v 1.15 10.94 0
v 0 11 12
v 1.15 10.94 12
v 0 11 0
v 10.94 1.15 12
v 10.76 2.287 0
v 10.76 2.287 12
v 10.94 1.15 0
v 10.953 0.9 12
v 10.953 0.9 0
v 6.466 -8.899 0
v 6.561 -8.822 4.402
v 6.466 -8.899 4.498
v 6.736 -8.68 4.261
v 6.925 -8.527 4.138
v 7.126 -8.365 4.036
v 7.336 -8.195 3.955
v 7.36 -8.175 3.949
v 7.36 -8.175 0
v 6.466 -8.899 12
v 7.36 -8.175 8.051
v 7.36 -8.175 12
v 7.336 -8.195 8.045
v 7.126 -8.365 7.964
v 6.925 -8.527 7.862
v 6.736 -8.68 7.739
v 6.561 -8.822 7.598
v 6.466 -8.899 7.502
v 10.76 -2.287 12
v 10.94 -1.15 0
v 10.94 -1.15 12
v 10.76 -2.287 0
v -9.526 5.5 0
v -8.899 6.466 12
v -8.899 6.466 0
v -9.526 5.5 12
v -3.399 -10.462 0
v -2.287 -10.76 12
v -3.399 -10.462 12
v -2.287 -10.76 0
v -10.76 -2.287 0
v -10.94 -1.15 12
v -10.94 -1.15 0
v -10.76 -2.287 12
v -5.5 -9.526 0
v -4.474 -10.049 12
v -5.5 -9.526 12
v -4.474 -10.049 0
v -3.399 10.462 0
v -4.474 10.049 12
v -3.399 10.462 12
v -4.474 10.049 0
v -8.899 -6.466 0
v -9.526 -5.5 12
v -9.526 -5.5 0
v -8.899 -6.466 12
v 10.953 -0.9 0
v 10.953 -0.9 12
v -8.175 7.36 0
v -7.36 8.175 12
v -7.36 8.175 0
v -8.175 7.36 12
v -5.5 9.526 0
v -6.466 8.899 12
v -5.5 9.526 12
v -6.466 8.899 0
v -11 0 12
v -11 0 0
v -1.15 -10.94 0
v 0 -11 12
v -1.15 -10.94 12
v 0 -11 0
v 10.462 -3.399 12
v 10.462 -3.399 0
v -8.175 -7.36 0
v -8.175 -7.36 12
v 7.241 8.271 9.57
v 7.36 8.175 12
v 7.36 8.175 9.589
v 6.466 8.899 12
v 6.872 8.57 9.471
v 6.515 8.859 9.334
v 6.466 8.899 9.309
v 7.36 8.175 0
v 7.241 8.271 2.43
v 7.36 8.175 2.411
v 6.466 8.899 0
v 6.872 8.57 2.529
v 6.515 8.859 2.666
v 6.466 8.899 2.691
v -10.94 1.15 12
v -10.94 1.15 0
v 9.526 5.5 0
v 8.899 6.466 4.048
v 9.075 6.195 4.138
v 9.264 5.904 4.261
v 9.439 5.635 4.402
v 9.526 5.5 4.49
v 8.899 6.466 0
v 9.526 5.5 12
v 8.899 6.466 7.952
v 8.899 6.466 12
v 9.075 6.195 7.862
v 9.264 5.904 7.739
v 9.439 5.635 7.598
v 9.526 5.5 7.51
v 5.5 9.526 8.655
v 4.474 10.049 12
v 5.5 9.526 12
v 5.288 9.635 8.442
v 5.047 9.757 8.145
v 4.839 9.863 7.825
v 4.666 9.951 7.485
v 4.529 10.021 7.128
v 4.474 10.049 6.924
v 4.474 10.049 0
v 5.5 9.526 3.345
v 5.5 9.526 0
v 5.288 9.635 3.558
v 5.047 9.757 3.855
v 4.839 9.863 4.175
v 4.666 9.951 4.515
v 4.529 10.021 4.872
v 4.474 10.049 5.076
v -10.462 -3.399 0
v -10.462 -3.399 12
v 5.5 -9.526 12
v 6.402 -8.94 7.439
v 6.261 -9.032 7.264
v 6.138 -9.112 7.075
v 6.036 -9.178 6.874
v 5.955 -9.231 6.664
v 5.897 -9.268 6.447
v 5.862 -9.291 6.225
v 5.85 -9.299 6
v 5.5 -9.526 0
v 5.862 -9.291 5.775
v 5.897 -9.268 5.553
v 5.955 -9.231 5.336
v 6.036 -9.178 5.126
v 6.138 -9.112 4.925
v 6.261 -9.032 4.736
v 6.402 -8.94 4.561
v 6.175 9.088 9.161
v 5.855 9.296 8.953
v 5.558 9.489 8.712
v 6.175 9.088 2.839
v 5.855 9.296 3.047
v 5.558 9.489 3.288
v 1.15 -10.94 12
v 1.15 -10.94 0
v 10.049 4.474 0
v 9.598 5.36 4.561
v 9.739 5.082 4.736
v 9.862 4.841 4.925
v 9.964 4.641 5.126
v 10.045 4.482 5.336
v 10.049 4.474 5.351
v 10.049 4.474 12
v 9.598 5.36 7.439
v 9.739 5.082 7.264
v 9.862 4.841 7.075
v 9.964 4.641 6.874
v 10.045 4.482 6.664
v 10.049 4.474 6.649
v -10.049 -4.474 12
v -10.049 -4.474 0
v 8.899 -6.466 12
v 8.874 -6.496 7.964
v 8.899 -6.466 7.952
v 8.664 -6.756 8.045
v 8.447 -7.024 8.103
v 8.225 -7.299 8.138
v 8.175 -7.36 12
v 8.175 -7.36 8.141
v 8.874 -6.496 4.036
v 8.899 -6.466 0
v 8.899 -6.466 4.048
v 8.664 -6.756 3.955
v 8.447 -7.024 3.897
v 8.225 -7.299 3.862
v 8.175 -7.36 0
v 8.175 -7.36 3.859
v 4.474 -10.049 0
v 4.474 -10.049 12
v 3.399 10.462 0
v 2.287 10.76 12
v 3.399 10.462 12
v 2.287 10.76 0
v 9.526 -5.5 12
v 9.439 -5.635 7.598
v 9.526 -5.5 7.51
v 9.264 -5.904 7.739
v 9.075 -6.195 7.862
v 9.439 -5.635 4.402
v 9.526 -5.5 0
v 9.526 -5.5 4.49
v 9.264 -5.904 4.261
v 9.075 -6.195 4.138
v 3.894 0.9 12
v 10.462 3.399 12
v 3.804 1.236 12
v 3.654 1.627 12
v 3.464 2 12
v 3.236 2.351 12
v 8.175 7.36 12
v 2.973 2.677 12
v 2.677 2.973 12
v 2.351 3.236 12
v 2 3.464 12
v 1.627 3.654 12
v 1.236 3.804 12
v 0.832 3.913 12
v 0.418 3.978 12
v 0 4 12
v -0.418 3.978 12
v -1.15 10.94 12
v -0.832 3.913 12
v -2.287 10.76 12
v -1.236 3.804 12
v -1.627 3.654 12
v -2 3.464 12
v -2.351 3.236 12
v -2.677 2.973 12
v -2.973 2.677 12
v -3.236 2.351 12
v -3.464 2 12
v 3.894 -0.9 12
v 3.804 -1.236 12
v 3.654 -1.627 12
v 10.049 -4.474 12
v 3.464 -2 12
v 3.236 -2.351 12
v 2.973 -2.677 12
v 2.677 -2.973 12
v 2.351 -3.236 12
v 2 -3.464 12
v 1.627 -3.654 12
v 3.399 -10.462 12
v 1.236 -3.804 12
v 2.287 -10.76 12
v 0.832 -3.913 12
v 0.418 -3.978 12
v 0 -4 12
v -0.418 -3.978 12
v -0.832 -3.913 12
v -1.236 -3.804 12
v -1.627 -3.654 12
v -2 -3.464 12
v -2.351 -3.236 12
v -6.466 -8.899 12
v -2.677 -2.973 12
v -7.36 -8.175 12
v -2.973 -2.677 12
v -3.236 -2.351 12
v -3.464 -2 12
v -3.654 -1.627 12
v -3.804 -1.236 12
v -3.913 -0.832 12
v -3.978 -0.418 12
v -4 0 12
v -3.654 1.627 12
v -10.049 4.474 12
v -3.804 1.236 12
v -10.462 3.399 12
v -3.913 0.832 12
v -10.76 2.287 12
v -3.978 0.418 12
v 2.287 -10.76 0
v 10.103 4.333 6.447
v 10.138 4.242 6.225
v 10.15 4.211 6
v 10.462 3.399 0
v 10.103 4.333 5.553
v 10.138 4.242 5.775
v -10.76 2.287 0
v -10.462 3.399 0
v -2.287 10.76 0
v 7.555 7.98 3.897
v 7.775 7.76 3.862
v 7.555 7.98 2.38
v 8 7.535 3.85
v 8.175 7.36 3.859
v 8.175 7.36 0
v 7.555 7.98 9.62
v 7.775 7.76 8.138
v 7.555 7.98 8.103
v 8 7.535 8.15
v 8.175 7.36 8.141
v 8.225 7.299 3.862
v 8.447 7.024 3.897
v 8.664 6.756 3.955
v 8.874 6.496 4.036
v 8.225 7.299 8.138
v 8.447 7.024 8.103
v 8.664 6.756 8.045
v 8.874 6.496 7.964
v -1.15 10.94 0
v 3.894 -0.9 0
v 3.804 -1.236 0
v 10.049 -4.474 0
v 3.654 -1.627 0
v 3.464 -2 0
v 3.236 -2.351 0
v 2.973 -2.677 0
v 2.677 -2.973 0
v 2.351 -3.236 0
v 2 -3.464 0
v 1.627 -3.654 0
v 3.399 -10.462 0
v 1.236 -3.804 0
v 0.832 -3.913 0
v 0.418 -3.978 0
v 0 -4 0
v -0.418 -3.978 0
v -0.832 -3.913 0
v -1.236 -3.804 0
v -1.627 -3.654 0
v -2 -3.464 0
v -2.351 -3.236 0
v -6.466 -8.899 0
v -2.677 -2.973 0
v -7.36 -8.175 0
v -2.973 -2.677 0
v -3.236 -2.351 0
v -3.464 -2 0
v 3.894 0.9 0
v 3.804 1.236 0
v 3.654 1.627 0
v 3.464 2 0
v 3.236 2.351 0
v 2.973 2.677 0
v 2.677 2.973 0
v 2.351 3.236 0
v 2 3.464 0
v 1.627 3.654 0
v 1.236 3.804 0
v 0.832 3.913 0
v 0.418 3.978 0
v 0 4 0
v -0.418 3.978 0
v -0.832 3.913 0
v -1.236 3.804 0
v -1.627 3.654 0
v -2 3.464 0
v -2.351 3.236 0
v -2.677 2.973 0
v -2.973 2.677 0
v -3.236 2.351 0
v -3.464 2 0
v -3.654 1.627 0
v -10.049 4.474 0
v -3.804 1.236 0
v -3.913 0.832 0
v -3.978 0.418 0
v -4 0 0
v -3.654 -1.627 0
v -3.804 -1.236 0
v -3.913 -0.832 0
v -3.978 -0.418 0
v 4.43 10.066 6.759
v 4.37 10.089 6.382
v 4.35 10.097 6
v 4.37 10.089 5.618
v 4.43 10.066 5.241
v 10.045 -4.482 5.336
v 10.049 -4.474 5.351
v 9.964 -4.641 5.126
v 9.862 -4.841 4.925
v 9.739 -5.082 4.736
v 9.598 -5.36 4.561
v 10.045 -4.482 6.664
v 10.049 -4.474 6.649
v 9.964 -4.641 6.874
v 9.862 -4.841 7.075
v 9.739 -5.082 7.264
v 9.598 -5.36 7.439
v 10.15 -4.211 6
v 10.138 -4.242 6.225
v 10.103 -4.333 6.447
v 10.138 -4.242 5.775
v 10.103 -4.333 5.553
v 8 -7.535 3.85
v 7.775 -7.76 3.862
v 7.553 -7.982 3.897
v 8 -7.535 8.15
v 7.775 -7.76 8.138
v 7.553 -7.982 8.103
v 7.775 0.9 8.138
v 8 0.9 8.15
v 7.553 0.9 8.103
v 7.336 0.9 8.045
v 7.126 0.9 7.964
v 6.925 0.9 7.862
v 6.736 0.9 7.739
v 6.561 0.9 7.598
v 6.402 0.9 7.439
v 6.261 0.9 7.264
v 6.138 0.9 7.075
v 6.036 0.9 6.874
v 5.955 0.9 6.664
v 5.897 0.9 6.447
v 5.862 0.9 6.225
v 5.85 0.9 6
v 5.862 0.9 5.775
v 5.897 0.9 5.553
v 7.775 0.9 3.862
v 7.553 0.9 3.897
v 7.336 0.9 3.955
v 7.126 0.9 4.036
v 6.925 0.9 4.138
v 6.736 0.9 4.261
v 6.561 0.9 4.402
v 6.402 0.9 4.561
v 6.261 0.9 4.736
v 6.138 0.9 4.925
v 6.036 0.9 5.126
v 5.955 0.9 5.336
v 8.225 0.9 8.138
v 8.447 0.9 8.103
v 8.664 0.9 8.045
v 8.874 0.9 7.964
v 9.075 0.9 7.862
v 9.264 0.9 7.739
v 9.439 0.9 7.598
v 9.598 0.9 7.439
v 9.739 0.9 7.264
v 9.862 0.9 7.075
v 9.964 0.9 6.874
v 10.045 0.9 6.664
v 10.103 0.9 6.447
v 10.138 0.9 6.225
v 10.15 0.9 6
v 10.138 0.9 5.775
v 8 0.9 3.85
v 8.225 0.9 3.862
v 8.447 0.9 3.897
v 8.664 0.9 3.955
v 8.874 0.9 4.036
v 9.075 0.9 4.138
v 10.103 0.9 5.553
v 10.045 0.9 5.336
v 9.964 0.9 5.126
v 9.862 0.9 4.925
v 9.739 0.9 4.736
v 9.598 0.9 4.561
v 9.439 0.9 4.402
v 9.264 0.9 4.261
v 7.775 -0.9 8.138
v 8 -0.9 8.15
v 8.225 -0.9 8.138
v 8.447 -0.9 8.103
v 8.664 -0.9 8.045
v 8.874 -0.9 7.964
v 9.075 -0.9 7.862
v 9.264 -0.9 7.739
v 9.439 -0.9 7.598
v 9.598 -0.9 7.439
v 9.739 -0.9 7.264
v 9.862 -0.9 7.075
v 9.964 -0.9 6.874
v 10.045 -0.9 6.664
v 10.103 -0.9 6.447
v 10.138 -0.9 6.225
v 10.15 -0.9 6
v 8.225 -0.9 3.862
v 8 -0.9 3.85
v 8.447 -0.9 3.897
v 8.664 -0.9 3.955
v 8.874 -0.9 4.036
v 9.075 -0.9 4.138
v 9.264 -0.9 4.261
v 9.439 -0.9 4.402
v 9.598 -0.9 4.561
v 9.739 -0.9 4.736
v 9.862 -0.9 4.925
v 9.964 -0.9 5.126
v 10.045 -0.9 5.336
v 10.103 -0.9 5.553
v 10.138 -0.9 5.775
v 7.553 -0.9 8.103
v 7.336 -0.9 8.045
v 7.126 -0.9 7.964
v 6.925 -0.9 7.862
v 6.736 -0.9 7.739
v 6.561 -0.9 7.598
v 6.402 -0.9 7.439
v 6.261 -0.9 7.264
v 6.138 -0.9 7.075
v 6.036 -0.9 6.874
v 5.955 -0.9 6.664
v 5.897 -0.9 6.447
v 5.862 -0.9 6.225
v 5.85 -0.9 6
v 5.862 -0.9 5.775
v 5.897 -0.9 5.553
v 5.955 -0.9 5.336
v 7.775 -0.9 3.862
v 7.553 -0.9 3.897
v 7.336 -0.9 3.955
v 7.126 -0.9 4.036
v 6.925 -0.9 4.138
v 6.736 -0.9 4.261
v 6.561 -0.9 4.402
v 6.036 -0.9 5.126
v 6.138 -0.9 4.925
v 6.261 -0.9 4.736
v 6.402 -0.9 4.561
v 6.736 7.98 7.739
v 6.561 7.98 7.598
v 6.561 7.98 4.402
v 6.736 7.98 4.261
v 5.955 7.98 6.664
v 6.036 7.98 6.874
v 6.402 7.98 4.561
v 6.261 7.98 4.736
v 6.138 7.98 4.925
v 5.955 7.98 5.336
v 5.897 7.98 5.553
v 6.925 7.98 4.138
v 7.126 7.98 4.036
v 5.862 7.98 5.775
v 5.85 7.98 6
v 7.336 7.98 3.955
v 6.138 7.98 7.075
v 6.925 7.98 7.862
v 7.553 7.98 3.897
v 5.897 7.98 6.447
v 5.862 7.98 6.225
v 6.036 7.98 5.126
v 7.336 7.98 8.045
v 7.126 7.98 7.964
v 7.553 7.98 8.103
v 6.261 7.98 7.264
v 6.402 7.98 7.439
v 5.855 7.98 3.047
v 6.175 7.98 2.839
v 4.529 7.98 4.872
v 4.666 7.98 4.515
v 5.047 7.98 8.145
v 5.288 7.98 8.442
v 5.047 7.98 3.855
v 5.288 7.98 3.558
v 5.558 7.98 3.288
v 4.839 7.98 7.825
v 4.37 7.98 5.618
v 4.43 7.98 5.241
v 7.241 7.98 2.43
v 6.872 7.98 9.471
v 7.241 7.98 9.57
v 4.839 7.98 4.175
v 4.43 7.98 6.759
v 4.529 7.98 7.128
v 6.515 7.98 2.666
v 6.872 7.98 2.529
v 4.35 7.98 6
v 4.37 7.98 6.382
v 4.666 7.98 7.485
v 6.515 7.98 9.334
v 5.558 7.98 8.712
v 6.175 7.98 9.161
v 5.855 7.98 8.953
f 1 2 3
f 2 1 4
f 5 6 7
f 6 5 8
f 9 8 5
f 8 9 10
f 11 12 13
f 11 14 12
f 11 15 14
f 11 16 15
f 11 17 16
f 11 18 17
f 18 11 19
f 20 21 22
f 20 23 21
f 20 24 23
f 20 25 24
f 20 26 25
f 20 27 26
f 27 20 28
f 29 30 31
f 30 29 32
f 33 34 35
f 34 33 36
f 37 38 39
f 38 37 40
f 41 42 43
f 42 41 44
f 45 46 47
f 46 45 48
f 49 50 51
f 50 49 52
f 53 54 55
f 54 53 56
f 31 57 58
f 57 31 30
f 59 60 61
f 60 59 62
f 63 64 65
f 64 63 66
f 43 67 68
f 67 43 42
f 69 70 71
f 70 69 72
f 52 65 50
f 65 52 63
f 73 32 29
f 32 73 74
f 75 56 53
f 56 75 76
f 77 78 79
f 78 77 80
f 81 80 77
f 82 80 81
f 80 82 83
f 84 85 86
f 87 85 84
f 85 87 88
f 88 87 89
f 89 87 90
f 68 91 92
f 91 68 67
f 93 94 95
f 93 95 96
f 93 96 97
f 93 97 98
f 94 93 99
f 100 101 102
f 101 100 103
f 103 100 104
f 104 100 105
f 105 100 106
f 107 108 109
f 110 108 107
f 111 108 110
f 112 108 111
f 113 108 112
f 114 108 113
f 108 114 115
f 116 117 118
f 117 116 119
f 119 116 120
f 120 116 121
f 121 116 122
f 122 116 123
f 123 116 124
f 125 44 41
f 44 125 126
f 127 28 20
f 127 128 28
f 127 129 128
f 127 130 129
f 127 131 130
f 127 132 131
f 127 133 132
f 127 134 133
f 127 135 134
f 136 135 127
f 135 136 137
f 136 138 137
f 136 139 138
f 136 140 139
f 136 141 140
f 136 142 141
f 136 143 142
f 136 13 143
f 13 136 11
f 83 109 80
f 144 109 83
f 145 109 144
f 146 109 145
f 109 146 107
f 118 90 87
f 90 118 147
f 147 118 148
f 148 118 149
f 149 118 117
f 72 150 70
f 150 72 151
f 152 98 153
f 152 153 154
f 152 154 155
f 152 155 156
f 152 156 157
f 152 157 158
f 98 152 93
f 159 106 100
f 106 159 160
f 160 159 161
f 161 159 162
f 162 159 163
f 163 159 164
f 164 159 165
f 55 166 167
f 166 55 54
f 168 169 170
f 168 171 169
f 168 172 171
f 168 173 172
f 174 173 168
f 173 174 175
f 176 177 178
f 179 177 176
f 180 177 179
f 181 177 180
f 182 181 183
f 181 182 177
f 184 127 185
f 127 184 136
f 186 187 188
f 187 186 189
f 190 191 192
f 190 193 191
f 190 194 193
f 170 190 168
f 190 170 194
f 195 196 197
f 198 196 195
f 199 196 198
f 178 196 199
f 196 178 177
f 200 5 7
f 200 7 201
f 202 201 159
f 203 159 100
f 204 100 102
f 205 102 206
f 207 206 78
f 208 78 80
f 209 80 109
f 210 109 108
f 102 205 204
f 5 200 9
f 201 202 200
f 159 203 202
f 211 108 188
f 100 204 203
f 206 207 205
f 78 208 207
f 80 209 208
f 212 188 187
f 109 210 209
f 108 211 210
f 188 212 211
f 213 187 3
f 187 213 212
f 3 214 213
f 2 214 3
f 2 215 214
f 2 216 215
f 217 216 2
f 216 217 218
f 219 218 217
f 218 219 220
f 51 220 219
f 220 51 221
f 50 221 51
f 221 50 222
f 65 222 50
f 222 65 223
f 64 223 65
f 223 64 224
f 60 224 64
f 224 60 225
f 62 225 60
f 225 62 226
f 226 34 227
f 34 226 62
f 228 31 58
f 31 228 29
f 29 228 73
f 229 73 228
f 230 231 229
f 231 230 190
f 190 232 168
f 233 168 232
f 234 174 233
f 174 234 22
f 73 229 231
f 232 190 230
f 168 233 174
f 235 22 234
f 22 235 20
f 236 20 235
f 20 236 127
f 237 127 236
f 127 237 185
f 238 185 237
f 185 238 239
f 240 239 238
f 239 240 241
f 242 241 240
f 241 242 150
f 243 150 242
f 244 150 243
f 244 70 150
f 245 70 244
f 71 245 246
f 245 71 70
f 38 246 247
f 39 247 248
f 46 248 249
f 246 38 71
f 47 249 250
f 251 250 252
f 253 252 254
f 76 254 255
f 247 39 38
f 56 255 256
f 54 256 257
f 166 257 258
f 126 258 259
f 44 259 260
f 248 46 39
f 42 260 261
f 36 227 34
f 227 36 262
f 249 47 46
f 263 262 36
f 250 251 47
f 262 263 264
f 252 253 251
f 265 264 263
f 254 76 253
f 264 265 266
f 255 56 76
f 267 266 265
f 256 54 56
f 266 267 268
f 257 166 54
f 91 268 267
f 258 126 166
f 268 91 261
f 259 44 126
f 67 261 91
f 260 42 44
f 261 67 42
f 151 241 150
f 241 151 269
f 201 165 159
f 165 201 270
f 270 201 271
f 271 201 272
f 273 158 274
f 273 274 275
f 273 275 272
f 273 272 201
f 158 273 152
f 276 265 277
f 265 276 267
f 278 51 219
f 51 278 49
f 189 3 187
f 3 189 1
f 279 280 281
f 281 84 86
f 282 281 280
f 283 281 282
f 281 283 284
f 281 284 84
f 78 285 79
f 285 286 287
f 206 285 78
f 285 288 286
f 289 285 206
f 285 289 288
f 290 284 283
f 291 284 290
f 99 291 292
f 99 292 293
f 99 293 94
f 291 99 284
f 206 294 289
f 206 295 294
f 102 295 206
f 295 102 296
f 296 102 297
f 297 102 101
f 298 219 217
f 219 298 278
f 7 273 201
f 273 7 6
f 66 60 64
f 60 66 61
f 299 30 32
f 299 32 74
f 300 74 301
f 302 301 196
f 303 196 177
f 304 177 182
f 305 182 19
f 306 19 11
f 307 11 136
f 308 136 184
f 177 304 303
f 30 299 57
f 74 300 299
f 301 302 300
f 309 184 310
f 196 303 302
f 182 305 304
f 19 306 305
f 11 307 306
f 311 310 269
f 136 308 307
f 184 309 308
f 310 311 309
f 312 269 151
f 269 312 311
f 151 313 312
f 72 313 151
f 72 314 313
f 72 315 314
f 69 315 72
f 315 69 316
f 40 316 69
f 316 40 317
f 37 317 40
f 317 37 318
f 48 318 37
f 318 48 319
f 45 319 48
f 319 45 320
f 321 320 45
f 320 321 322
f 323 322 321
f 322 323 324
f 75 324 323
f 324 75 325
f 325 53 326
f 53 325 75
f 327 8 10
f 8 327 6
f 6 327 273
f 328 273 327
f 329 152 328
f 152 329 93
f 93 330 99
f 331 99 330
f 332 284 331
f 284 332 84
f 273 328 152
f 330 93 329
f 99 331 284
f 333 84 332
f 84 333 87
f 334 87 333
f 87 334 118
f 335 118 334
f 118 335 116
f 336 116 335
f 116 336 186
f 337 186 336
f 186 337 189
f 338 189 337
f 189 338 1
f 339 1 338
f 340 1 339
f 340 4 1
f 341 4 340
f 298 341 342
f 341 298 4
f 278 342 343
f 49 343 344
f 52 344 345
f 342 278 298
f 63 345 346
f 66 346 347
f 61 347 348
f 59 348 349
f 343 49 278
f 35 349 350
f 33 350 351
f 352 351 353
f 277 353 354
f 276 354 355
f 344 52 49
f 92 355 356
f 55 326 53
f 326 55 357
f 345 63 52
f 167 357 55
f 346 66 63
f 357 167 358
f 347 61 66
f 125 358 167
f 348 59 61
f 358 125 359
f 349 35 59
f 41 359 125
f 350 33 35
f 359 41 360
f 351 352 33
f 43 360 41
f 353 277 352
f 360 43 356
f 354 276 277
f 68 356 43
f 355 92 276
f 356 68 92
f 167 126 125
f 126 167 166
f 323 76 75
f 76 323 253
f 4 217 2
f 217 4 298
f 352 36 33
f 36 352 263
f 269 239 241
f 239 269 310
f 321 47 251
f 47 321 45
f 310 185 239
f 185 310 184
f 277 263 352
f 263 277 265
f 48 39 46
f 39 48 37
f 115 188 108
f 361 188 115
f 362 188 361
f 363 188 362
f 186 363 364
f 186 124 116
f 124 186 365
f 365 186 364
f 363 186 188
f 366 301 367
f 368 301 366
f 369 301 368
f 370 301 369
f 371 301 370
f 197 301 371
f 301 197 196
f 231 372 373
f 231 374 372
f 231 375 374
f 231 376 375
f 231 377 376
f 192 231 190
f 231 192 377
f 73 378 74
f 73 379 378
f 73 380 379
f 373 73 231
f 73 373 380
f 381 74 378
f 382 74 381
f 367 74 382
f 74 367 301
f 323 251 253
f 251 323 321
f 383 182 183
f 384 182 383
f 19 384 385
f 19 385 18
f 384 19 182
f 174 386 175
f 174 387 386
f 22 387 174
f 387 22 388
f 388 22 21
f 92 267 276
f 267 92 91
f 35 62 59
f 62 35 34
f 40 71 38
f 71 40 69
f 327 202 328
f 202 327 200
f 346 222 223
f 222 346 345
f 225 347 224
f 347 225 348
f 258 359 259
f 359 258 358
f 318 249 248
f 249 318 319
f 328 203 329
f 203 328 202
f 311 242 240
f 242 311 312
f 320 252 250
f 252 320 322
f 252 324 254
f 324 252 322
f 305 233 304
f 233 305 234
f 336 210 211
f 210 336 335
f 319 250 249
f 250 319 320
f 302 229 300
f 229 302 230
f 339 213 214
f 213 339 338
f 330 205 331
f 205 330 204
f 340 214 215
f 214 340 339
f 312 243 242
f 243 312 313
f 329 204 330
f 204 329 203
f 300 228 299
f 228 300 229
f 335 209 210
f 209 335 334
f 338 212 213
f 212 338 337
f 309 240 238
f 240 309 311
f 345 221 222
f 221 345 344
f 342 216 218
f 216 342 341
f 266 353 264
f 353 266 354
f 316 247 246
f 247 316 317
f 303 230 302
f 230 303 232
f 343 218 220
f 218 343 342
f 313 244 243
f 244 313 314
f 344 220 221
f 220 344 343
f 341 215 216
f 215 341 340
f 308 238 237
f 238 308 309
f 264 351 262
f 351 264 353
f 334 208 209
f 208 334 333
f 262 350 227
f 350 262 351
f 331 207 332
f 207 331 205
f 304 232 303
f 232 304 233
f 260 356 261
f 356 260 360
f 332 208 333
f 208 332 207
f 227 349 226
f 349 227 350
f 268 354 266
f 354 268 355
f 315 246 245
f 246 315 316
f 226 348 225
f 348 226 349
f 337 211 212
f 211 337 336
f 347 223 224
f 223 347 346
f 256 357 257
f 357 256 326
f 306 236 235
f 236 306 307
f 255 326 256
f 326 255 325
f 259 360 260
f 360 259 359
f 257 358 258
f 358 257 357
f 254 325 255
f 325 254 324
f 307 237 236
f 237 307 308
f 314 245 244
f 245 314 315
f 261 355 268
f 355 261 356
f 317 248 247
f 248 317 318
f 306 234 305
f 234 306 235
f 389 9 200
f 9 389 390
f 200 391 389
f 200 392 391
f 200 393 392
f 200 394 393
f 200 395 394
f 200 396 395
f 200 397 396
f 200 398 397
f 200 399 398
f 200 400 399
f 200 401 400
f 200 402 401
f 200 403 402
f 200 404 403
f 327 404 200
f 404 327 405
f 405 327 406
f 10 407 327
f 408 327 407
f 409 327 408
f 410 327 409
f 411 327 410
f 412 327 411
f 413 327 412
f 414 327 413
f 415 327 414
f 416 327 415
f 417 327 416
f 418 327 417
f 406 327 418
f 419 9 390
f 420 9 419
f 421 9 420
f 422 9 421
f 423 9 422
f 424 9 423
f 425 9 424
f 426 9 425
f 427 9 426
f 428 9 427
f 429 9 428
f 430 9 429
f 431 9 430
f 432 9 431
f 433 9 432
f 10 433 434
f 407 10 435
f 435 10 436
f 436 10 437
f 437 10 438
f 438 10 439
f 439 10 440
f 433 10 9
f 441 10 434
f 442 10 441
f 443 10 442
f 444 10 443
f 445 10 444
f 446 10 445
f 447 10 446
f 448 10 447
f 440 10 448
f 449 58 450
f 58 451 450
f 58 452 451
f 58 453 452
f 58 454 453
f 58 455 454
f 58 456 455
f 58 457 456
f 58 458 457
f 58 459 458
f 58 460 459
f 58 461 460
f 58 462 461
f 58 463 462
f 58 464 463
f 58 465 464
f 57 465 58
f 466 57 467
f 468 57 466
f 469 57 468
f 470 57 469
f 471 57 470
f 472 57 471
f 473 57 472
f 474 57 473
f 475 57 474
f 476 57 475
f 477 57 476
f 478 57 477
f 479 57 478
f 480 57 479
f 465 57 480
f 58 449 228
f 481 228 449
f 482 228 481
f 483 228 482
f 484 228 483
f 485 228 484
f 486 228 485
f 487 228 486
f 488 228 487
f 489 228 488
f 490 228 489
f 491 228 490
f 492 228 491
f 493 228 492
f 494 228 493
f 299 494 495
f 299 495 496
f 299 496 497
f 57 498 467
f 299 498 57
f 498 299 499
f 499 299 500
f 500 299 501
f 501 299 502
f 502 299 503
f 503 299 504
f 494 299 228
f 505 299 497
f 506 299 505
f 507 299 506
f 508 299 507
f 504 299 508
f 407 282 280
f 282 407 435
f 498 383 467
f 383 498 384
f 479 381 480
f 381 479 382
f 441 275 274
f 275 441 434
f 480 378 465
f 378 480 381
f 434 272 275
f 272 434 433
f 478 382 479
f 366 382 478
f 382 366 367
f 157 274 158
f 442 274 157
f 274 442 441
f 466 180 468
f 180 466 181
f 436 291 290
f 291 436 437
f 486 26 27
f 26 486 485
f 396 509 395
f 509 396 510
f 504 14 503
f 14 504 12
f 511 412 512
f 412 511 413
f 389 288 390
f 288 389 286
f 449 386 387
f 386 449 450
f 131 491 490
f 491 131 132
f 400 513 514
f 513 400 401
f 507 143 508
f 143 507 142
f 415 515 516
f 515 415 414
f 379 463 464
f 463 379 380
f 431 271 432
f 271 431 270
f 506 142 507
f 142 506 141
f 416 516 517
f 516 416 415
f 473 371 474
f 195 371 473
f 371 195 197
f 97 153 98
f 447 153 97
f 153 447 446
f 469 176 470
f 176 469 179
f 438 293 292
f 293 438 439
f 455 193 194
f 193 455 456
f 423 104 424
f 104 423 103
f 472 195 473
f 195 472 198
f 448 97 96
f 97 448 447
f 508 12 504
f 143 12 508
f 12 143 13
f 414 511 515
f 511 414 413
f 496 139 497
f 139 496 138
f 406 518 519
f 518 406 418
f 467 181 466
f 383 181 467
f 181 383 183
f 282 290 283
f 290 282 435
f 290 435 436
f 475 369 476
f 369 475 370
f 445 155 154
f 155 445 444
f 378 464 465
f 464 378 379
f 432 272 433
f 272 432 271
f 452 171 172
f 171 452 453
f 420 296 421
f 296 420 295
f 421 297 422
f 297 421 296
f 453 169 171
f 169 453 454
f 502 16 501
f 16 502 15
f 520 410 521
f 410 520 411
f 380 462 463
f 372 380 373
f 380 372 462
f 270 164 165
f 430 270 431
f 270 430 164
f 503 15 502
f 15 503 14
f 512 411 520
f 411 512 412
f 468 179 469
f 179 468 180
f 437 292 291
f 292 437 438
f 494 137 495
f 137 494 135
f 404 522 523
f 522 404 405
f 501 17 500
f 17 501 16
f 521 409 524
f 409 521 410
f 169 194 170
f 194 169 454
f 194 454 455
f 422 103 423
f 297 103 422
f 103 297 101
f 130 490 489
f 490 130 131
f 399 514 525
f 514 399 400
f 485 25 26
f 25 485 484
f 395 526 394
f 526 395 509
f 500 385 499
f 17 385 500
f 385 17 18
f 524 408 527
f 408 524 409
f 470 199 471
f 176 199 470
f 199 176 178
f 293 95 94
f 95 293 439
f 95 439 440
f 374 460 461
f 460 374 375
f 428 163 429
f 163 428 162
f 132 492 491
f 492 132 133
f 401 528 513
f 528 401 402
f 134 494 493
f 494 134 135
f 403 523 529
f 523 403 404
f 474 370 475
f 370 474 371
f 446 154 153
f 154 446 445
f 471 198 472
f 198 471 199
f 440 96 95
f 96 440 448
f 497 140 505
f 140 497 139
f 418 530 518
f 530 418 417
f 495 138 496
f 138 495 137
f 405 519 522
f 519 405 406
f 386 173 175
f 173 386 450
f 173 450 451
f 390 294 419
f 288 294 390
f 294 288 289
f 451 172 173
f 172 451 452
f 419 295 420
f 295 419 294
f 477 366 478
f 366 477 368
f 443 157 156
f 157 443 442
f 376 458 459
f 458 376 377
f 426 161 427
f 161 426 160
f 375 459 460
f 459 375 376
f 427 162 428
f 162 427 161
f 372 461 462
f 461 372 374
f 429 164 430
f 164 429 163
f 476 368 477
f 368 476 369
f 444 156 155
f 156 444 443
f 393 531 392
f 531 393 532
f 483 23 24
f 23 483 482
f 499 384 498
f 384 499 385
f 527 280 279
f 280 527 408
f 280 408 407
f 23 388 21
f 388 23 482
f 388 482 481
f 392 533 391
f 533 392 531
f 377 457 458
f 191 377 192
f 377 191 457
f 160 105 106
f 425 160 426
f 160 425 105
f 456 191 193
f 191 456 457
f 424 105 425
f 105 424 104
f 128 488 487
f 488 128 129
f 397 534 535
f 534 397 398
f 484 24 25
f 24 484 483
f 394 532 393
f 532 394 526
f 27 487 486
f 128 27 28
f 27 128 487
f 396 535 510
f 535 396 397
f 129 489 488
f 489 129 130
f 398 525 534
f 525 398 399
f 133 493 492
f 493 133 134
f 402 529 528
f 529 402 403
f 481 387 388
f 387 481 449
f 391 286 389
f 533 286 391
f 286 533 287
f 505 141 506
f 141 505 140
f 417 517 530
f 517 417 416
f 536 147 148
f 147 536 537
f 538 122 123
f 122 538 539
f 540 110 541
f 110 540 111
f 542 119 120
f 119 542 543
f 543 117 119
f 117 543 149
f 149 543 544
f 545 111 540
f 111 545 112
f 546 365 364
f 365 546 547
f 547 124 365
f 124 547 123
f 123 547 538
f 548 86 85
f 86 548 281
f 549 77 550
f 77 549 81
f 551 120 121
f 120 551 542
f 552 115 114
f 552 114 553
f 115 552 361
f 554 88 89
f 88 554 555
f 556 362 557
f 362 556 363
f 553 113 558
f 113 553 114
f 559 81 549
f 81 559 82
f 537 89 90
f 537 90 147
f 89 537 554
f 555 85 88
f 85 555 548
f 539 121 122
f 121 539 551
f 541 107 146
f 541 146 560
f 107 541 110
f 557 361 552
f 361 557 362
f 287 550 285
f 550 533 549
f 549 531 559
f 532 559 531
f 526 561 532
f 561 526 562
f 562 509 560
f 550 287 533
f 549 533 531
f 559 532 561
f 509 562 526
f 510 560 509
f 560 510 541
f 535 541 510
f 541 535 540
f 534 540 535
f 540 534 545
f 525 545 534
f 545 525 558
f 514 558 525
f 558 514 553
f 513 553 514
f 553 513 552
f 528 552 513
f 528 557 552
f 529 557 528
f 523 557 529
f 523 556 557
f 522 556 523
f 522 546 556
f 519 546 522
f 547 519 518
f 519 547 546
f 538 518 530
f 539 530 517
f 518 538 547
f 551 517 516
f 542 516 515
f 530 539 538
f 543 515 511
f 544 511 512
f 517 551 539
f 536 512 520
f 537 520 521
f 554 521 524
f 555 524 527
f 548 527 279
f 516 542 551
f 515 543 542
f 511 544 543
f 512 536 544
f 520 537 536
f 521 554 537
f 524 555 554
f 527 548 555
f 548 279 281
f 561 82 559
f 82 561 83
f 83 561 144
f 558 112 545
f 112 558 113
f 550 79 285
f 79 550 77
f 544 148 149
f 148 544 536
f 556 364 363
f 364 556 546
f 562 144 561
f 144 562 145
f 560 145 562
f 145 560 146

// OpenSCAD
// C-style split collar for 8 mm shaft.
$fn = 60;
eps = 0.02;
shaft_d = 8;
outer_d = 22;
width = 12;
slit_w = 1.8;
screw_d = 4.3;
difference() {
    cylinder(d = outer_d, h = width);
    translate([0, 0, -eps]) cylinder(d = shaft_d, h = width + 2 * eps);
    translate([0, -slit_w / 2, -eps]) cube([outer_d / 2 + eps, slit_w, width + 2 * eps]);
    translate([outer_d / 2 - 3, -outer_d / 2 - eps, width / 2]) rotate([-90, 0, 0]) cylinder(d = screw_d, h = outer_d + 2 * eps);
    translate([outer_d / 2 - 3, outer_d / 2 - 3 - eps, width / 2]) rotate([-90, 0, 0]) cylinder(d = screw_d + 3, h = 3 + 2 * eps);
}
